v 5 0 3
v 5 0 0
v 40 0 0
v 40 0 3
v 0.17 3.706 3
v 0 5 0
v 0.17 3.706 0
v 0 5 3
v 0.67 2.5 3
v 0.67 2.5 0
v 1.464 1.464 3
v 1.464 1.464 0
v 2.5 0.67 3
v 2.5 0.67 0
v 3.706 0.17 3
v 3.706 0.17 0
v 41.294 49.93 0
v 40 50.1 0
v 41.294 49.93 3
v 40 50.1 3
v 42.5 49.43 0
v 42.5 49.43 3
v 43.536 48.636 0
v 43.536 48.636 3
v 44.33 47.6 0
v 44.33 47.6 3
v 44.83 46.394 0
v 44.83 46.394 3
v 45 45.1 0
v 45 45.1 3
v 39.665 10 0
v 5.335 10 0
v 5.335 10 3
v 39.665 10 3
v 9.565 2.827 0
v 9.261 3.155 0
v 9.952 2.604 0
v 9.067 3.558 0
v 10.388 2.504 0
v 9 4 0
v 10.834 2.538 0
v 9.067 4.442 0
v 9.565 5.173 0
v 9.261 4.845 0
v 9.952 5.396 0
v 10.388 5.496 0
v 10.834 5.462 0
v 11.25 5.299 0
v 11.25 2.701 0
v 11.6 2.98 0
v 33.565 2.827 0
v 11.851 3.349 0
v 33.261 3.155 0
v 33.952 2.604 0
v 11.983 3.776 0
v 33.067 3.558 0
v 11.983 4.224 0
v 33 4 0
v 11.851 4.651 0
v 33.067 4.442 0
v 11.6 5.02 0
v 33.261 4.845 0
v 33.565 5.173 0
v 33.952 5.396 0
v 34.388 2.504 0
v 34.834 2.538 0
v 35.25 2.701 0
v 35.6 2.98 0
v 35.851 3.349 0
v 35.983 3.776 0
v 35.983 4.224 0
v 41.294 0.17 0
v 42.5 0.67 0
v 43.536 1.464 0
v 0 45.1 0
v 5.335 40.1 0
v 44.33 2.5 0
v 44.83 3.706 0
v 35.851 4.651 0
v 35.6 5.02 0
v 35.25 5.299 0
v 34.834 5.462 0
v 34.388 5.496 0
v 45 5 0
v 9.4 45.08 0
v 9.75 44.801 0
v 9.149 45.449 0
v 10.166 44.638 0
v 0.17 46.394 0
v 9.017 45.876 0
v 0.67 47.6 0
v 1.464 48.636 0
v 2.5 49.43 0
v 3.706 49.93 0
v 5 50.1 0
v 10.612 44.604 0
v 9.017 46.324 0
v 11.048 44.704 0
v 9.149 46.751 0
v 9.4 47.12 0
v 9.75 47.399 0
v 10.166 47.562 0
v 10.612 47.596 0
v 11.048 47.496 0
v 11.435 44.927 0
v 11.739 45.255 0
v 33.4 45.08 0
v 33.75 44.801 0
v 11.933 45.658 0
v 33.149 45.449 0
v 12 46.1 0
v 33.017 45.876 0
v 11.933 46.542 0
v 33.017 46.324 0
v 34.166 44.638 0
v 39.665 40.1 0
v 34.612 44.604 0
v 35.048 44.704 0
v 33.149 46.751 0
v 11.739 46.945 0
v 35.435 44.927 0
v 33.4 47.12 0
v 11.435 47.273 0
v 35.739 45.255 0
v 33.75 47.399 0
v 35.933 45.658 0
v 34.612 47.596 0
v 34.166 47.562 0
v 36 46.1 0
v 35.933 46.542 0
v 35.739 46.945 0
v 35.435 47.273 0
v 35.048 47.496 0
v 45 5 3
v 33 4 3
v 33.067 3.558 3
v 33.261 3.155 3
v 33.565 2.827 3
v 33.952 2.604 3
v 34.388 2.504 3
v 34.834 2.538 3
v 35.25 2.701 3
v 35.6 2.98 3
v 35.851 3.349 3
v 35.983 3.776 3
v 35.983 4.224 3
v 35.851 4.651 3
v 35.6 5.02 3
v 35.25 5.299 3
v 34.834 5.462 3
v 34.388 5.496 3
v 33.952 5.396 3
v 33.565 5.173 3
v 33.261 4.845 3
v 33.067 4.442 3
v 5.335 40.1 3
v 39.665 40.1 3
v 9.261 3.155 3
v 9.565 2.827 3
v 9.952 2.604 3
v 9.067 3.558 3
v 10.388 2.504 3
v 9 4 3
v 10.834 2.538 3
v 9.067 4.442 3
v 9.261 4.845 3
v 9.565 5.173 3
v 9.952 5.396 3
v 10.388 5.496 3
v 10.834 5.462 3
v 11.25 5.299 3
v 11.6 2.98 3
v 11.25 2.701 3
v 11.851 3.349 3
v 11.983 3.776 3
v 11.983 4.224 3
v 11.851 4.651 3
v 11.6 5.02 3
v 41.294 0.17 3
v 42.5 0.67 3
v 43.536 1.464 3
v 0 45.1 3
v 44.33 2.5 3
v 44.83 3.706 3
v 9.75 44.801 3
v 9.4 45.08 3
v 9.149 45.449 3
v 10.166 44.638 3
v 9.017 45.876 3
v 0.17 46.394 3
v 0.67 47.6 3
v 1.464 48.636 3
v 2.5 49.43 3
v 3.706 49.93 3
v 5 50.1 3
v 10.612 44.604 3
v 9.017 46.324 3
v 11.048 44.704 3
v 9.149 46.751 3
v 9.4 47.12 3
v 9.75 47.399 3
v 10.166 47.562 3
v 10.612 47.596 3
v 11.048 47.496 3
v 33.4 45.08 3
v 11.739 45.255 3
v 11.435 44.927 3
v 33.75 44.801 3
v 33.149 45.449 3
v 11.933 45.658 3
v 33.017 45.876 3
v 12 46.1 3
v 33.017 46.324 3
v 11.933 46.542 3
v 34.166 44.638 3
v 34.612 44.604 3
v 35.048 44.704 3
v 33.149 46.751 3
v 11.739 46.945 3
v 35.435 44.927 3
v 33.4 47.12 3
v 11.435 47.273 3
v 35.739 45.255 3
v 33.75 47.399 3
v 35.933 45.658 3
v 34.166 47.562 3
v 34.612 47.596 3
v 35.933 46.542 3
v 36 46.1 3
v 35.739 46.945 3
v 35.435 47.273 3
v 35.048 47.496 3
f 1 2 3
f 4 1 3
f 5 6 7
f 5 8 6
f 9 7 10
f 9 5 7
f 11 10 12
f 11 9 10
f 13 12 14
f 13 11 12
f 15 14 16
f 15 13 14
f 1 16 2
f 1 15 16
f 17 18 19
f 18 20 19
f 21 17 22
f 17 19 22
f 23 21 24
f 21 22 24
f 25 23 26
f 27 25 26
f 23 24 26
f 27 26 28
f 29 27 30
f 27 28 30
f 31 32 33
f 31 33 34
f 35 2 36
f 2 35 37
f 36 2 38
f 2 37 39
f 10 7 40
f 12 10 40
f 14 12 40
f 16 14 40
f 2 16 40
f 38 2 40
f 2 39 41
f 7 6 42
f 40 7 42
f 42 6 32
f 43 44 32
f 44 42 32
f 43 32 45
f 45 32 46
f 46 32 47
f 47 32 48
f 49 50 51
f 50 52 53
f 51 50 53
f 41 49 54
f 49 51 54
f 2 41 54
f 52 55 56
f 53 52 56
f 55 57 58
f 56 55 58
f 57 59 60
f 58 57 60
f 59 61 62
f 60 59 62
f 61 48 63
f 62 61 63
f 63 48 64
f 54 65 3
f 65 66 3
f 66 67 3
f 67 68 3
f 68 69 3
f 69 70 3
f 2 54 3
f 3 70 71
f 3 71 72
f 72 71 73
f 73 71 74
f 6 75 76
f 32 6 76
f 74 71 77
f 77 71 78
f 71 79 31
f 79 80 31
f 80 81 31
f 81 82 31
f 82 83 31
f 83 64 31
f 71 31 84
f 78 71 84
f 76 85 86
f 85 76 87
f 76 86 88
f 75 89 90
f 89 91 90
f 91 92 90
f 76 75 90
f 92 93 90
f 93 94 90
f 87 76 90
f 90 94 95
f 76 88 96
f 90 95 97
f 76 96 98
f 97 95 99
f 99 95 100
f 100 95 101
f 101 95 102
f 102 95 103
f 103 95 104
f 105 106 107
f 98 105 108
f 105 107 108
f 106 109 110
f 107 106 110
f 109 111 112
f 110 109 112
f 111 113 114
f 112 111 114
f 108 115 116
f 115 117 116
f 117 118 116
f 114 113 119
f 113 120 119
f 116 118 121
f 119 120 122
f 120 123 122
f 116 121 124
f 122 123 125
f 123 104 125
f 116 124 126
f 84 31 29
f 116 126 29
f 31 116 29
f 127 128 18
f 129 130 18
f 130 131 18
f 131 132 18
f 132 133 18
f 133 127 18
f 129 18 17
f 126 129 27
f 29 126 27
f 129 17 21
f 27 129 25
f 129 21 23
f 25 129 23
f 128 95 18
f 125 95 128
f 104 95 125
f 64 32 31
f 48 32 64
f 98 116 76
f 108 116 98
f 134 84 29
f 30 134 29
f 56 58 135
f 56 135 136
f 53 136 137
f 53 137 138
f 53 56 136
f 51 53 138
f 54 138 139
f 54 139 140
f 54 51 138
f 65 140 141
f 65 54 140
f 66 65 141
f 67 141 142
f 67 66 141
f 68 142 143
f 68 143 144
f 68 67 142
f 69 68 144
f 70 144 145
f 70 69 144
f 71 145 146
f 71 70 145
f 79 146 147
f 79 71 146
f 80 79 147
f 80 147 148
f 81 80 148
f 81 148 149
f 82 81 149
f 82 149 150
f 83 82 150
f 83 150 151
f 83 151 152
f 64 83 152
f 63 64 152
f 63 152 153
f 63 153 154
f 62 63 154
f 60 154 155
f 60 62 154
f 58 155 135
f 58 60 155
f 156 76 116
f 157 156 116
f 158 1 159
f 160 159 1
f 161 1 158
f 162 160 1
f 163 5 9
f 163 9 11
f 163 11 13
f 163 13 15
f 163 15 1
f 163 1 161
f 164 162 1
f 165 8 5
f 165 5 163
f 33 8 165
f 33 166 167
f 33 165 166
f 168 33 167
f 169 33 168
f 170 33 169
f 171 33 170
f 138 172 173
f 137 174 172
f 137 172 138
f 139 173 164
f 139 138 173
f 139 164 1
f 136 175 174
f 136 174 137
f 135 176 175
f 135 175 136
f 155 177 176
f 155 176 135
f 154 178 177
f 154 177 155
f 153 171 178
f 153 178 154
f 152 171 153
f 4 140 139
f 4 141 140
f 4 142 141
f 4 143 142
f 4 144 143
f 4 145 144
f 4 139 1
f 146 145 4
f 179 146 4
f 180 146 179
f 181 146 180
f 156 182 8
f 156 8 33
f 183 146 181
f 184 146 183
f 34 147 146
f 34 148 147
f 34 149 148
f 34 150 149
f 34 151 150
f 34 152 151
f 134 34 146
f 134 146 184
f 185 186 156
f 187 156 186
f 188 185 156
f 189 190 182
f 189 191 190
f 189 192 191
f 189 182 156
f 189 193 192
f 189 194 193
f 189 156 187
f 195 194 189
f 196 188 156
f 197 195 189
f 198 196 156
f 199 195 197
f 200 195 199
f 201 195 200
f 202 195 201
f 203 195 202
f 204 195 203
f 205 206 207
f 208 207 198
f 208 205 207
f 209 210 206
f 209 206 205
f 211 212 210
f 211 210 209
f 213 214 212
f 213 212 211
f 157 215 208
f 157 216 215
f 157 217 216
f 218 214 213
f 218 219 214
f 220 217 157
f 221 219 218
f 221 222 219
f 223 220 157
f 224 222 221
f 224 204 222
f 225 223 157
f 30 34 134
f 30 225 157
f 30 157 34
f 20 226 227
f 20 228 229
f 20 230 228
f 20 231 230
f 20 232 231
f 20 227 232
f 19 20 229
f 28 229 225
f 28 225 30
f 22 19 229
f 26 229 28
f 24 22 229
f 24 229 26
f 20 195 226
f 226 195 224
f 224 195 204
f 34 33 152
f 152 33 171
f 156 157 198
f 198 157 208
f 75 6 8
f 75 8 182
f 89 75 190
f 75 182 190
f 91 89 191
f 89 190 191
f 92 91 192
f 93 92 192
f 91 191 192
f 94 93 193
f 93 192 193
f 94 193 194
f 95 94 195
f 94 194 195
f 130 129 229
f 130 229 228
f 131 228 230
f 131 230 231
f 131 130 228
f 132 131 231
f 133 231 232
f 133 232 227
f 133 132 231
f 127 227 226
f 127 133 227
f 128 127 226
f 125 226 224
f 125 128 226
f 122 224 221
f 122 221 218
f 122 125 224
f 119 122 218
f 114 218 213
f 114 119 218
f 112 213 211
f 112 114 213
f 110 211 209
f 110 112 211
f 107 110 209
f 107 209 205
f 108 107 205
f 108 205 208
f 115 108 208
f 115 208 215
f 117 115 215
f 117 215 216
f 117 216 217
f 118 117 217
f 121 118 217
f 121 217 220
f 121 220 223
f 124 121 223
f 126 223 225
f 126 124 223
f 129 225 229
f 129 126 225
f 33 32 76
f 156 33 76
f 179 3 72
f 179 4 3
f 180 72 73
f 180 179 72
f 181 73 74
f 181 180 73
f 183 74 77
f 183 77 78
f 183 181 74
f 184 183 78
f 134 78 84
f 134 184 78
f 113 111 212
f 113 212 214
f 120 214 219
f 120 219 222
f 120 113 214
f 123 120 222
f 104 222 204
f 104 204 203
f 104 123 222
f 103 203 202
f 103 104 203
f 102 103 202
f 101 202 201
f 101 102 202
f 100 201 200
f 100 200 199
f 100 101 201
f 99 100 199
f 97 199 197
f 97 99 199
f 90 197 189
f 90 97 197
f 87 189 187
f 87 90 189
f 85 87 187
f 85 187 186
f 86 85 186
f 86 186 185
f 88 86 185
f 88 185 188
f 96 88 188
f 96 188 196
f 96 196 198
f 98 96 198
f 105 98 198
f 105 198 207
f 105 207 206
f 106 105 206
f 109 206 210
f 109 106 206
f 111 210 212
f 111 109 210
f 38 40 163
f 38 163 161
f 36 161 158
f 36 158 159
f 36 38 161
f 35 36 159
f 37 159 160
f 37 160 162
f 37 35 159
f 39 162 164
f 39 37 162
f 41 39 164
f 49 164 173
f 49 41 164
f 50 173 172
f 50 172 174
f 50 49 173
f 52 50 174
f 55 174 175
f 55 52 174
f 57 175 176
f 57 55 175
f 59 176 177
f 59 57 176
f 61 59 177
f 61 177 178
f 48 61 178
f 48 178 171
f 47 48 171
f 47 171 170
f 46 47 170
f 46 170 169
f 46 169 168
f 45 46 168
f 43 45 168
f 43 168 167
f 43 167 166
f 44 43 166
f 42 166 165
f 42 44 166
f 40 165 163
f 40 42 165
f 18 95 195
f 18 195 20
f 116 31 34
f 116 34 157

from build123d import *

# Parameters (mm, degrees)
SKETCH_1_W      = 45
SKETCH_1_H      = 50.1
SKETCH_1_R      = 1.5
SKETCH_1_W_2    = 34.330352234
SKETCH_1_H_2    = 30.1
EXTRUDE_1_DEPTH = 3
FILLET_1_R      = 5


with BuildPart() as part:
    # 草图1 → 凸台-拉伸1 (new body)
    with BuildSketch(Plane.XY):
        with Locations((22.5, 25.05)):
            Rectangle(SKETCH_1_W, SKETCH_1_H)
        with Locations((10.5, 46.1)):
            Circle(SKETCH_1_R, mode=Mode.SUBTRACT)
        with Locations((34.5, 46.1)):
            Circle(SKETCH_1_R, mode=Mode.SUBTRACT)
        with Locations(Location((34.5, 4, 0), (0, 0, 180))):
            Circle(SKETCH_1_R, mode=Mode.SUBTRACT)
        with Locations(Location((10.5, 4, 0), (0, 0, 180))):
            Circle(SKETCH_1_R, mode=Mode.SUBTRACT)
        with Locations((22.5, 25.05)):
            Rectangle(SKETCH_1_W_2, SKETCH_1_H_2, mode=Mode.SUBTRACT)
    extrude(amount=EXTRUDE_1_DEPTH)

    # 圆角1
    fillet_1_edges = [part.edges().sort_by_distance(p)[0] for p in [
        (0, 50.1, 1.5),
        (45, 50.1, 1.5),
        (45, 0, 1.5),
        (0, 0, 1.5),
    ]]
    fillet(fillet_1_edges, radius=FILLET_1_R)


solid = part.part
